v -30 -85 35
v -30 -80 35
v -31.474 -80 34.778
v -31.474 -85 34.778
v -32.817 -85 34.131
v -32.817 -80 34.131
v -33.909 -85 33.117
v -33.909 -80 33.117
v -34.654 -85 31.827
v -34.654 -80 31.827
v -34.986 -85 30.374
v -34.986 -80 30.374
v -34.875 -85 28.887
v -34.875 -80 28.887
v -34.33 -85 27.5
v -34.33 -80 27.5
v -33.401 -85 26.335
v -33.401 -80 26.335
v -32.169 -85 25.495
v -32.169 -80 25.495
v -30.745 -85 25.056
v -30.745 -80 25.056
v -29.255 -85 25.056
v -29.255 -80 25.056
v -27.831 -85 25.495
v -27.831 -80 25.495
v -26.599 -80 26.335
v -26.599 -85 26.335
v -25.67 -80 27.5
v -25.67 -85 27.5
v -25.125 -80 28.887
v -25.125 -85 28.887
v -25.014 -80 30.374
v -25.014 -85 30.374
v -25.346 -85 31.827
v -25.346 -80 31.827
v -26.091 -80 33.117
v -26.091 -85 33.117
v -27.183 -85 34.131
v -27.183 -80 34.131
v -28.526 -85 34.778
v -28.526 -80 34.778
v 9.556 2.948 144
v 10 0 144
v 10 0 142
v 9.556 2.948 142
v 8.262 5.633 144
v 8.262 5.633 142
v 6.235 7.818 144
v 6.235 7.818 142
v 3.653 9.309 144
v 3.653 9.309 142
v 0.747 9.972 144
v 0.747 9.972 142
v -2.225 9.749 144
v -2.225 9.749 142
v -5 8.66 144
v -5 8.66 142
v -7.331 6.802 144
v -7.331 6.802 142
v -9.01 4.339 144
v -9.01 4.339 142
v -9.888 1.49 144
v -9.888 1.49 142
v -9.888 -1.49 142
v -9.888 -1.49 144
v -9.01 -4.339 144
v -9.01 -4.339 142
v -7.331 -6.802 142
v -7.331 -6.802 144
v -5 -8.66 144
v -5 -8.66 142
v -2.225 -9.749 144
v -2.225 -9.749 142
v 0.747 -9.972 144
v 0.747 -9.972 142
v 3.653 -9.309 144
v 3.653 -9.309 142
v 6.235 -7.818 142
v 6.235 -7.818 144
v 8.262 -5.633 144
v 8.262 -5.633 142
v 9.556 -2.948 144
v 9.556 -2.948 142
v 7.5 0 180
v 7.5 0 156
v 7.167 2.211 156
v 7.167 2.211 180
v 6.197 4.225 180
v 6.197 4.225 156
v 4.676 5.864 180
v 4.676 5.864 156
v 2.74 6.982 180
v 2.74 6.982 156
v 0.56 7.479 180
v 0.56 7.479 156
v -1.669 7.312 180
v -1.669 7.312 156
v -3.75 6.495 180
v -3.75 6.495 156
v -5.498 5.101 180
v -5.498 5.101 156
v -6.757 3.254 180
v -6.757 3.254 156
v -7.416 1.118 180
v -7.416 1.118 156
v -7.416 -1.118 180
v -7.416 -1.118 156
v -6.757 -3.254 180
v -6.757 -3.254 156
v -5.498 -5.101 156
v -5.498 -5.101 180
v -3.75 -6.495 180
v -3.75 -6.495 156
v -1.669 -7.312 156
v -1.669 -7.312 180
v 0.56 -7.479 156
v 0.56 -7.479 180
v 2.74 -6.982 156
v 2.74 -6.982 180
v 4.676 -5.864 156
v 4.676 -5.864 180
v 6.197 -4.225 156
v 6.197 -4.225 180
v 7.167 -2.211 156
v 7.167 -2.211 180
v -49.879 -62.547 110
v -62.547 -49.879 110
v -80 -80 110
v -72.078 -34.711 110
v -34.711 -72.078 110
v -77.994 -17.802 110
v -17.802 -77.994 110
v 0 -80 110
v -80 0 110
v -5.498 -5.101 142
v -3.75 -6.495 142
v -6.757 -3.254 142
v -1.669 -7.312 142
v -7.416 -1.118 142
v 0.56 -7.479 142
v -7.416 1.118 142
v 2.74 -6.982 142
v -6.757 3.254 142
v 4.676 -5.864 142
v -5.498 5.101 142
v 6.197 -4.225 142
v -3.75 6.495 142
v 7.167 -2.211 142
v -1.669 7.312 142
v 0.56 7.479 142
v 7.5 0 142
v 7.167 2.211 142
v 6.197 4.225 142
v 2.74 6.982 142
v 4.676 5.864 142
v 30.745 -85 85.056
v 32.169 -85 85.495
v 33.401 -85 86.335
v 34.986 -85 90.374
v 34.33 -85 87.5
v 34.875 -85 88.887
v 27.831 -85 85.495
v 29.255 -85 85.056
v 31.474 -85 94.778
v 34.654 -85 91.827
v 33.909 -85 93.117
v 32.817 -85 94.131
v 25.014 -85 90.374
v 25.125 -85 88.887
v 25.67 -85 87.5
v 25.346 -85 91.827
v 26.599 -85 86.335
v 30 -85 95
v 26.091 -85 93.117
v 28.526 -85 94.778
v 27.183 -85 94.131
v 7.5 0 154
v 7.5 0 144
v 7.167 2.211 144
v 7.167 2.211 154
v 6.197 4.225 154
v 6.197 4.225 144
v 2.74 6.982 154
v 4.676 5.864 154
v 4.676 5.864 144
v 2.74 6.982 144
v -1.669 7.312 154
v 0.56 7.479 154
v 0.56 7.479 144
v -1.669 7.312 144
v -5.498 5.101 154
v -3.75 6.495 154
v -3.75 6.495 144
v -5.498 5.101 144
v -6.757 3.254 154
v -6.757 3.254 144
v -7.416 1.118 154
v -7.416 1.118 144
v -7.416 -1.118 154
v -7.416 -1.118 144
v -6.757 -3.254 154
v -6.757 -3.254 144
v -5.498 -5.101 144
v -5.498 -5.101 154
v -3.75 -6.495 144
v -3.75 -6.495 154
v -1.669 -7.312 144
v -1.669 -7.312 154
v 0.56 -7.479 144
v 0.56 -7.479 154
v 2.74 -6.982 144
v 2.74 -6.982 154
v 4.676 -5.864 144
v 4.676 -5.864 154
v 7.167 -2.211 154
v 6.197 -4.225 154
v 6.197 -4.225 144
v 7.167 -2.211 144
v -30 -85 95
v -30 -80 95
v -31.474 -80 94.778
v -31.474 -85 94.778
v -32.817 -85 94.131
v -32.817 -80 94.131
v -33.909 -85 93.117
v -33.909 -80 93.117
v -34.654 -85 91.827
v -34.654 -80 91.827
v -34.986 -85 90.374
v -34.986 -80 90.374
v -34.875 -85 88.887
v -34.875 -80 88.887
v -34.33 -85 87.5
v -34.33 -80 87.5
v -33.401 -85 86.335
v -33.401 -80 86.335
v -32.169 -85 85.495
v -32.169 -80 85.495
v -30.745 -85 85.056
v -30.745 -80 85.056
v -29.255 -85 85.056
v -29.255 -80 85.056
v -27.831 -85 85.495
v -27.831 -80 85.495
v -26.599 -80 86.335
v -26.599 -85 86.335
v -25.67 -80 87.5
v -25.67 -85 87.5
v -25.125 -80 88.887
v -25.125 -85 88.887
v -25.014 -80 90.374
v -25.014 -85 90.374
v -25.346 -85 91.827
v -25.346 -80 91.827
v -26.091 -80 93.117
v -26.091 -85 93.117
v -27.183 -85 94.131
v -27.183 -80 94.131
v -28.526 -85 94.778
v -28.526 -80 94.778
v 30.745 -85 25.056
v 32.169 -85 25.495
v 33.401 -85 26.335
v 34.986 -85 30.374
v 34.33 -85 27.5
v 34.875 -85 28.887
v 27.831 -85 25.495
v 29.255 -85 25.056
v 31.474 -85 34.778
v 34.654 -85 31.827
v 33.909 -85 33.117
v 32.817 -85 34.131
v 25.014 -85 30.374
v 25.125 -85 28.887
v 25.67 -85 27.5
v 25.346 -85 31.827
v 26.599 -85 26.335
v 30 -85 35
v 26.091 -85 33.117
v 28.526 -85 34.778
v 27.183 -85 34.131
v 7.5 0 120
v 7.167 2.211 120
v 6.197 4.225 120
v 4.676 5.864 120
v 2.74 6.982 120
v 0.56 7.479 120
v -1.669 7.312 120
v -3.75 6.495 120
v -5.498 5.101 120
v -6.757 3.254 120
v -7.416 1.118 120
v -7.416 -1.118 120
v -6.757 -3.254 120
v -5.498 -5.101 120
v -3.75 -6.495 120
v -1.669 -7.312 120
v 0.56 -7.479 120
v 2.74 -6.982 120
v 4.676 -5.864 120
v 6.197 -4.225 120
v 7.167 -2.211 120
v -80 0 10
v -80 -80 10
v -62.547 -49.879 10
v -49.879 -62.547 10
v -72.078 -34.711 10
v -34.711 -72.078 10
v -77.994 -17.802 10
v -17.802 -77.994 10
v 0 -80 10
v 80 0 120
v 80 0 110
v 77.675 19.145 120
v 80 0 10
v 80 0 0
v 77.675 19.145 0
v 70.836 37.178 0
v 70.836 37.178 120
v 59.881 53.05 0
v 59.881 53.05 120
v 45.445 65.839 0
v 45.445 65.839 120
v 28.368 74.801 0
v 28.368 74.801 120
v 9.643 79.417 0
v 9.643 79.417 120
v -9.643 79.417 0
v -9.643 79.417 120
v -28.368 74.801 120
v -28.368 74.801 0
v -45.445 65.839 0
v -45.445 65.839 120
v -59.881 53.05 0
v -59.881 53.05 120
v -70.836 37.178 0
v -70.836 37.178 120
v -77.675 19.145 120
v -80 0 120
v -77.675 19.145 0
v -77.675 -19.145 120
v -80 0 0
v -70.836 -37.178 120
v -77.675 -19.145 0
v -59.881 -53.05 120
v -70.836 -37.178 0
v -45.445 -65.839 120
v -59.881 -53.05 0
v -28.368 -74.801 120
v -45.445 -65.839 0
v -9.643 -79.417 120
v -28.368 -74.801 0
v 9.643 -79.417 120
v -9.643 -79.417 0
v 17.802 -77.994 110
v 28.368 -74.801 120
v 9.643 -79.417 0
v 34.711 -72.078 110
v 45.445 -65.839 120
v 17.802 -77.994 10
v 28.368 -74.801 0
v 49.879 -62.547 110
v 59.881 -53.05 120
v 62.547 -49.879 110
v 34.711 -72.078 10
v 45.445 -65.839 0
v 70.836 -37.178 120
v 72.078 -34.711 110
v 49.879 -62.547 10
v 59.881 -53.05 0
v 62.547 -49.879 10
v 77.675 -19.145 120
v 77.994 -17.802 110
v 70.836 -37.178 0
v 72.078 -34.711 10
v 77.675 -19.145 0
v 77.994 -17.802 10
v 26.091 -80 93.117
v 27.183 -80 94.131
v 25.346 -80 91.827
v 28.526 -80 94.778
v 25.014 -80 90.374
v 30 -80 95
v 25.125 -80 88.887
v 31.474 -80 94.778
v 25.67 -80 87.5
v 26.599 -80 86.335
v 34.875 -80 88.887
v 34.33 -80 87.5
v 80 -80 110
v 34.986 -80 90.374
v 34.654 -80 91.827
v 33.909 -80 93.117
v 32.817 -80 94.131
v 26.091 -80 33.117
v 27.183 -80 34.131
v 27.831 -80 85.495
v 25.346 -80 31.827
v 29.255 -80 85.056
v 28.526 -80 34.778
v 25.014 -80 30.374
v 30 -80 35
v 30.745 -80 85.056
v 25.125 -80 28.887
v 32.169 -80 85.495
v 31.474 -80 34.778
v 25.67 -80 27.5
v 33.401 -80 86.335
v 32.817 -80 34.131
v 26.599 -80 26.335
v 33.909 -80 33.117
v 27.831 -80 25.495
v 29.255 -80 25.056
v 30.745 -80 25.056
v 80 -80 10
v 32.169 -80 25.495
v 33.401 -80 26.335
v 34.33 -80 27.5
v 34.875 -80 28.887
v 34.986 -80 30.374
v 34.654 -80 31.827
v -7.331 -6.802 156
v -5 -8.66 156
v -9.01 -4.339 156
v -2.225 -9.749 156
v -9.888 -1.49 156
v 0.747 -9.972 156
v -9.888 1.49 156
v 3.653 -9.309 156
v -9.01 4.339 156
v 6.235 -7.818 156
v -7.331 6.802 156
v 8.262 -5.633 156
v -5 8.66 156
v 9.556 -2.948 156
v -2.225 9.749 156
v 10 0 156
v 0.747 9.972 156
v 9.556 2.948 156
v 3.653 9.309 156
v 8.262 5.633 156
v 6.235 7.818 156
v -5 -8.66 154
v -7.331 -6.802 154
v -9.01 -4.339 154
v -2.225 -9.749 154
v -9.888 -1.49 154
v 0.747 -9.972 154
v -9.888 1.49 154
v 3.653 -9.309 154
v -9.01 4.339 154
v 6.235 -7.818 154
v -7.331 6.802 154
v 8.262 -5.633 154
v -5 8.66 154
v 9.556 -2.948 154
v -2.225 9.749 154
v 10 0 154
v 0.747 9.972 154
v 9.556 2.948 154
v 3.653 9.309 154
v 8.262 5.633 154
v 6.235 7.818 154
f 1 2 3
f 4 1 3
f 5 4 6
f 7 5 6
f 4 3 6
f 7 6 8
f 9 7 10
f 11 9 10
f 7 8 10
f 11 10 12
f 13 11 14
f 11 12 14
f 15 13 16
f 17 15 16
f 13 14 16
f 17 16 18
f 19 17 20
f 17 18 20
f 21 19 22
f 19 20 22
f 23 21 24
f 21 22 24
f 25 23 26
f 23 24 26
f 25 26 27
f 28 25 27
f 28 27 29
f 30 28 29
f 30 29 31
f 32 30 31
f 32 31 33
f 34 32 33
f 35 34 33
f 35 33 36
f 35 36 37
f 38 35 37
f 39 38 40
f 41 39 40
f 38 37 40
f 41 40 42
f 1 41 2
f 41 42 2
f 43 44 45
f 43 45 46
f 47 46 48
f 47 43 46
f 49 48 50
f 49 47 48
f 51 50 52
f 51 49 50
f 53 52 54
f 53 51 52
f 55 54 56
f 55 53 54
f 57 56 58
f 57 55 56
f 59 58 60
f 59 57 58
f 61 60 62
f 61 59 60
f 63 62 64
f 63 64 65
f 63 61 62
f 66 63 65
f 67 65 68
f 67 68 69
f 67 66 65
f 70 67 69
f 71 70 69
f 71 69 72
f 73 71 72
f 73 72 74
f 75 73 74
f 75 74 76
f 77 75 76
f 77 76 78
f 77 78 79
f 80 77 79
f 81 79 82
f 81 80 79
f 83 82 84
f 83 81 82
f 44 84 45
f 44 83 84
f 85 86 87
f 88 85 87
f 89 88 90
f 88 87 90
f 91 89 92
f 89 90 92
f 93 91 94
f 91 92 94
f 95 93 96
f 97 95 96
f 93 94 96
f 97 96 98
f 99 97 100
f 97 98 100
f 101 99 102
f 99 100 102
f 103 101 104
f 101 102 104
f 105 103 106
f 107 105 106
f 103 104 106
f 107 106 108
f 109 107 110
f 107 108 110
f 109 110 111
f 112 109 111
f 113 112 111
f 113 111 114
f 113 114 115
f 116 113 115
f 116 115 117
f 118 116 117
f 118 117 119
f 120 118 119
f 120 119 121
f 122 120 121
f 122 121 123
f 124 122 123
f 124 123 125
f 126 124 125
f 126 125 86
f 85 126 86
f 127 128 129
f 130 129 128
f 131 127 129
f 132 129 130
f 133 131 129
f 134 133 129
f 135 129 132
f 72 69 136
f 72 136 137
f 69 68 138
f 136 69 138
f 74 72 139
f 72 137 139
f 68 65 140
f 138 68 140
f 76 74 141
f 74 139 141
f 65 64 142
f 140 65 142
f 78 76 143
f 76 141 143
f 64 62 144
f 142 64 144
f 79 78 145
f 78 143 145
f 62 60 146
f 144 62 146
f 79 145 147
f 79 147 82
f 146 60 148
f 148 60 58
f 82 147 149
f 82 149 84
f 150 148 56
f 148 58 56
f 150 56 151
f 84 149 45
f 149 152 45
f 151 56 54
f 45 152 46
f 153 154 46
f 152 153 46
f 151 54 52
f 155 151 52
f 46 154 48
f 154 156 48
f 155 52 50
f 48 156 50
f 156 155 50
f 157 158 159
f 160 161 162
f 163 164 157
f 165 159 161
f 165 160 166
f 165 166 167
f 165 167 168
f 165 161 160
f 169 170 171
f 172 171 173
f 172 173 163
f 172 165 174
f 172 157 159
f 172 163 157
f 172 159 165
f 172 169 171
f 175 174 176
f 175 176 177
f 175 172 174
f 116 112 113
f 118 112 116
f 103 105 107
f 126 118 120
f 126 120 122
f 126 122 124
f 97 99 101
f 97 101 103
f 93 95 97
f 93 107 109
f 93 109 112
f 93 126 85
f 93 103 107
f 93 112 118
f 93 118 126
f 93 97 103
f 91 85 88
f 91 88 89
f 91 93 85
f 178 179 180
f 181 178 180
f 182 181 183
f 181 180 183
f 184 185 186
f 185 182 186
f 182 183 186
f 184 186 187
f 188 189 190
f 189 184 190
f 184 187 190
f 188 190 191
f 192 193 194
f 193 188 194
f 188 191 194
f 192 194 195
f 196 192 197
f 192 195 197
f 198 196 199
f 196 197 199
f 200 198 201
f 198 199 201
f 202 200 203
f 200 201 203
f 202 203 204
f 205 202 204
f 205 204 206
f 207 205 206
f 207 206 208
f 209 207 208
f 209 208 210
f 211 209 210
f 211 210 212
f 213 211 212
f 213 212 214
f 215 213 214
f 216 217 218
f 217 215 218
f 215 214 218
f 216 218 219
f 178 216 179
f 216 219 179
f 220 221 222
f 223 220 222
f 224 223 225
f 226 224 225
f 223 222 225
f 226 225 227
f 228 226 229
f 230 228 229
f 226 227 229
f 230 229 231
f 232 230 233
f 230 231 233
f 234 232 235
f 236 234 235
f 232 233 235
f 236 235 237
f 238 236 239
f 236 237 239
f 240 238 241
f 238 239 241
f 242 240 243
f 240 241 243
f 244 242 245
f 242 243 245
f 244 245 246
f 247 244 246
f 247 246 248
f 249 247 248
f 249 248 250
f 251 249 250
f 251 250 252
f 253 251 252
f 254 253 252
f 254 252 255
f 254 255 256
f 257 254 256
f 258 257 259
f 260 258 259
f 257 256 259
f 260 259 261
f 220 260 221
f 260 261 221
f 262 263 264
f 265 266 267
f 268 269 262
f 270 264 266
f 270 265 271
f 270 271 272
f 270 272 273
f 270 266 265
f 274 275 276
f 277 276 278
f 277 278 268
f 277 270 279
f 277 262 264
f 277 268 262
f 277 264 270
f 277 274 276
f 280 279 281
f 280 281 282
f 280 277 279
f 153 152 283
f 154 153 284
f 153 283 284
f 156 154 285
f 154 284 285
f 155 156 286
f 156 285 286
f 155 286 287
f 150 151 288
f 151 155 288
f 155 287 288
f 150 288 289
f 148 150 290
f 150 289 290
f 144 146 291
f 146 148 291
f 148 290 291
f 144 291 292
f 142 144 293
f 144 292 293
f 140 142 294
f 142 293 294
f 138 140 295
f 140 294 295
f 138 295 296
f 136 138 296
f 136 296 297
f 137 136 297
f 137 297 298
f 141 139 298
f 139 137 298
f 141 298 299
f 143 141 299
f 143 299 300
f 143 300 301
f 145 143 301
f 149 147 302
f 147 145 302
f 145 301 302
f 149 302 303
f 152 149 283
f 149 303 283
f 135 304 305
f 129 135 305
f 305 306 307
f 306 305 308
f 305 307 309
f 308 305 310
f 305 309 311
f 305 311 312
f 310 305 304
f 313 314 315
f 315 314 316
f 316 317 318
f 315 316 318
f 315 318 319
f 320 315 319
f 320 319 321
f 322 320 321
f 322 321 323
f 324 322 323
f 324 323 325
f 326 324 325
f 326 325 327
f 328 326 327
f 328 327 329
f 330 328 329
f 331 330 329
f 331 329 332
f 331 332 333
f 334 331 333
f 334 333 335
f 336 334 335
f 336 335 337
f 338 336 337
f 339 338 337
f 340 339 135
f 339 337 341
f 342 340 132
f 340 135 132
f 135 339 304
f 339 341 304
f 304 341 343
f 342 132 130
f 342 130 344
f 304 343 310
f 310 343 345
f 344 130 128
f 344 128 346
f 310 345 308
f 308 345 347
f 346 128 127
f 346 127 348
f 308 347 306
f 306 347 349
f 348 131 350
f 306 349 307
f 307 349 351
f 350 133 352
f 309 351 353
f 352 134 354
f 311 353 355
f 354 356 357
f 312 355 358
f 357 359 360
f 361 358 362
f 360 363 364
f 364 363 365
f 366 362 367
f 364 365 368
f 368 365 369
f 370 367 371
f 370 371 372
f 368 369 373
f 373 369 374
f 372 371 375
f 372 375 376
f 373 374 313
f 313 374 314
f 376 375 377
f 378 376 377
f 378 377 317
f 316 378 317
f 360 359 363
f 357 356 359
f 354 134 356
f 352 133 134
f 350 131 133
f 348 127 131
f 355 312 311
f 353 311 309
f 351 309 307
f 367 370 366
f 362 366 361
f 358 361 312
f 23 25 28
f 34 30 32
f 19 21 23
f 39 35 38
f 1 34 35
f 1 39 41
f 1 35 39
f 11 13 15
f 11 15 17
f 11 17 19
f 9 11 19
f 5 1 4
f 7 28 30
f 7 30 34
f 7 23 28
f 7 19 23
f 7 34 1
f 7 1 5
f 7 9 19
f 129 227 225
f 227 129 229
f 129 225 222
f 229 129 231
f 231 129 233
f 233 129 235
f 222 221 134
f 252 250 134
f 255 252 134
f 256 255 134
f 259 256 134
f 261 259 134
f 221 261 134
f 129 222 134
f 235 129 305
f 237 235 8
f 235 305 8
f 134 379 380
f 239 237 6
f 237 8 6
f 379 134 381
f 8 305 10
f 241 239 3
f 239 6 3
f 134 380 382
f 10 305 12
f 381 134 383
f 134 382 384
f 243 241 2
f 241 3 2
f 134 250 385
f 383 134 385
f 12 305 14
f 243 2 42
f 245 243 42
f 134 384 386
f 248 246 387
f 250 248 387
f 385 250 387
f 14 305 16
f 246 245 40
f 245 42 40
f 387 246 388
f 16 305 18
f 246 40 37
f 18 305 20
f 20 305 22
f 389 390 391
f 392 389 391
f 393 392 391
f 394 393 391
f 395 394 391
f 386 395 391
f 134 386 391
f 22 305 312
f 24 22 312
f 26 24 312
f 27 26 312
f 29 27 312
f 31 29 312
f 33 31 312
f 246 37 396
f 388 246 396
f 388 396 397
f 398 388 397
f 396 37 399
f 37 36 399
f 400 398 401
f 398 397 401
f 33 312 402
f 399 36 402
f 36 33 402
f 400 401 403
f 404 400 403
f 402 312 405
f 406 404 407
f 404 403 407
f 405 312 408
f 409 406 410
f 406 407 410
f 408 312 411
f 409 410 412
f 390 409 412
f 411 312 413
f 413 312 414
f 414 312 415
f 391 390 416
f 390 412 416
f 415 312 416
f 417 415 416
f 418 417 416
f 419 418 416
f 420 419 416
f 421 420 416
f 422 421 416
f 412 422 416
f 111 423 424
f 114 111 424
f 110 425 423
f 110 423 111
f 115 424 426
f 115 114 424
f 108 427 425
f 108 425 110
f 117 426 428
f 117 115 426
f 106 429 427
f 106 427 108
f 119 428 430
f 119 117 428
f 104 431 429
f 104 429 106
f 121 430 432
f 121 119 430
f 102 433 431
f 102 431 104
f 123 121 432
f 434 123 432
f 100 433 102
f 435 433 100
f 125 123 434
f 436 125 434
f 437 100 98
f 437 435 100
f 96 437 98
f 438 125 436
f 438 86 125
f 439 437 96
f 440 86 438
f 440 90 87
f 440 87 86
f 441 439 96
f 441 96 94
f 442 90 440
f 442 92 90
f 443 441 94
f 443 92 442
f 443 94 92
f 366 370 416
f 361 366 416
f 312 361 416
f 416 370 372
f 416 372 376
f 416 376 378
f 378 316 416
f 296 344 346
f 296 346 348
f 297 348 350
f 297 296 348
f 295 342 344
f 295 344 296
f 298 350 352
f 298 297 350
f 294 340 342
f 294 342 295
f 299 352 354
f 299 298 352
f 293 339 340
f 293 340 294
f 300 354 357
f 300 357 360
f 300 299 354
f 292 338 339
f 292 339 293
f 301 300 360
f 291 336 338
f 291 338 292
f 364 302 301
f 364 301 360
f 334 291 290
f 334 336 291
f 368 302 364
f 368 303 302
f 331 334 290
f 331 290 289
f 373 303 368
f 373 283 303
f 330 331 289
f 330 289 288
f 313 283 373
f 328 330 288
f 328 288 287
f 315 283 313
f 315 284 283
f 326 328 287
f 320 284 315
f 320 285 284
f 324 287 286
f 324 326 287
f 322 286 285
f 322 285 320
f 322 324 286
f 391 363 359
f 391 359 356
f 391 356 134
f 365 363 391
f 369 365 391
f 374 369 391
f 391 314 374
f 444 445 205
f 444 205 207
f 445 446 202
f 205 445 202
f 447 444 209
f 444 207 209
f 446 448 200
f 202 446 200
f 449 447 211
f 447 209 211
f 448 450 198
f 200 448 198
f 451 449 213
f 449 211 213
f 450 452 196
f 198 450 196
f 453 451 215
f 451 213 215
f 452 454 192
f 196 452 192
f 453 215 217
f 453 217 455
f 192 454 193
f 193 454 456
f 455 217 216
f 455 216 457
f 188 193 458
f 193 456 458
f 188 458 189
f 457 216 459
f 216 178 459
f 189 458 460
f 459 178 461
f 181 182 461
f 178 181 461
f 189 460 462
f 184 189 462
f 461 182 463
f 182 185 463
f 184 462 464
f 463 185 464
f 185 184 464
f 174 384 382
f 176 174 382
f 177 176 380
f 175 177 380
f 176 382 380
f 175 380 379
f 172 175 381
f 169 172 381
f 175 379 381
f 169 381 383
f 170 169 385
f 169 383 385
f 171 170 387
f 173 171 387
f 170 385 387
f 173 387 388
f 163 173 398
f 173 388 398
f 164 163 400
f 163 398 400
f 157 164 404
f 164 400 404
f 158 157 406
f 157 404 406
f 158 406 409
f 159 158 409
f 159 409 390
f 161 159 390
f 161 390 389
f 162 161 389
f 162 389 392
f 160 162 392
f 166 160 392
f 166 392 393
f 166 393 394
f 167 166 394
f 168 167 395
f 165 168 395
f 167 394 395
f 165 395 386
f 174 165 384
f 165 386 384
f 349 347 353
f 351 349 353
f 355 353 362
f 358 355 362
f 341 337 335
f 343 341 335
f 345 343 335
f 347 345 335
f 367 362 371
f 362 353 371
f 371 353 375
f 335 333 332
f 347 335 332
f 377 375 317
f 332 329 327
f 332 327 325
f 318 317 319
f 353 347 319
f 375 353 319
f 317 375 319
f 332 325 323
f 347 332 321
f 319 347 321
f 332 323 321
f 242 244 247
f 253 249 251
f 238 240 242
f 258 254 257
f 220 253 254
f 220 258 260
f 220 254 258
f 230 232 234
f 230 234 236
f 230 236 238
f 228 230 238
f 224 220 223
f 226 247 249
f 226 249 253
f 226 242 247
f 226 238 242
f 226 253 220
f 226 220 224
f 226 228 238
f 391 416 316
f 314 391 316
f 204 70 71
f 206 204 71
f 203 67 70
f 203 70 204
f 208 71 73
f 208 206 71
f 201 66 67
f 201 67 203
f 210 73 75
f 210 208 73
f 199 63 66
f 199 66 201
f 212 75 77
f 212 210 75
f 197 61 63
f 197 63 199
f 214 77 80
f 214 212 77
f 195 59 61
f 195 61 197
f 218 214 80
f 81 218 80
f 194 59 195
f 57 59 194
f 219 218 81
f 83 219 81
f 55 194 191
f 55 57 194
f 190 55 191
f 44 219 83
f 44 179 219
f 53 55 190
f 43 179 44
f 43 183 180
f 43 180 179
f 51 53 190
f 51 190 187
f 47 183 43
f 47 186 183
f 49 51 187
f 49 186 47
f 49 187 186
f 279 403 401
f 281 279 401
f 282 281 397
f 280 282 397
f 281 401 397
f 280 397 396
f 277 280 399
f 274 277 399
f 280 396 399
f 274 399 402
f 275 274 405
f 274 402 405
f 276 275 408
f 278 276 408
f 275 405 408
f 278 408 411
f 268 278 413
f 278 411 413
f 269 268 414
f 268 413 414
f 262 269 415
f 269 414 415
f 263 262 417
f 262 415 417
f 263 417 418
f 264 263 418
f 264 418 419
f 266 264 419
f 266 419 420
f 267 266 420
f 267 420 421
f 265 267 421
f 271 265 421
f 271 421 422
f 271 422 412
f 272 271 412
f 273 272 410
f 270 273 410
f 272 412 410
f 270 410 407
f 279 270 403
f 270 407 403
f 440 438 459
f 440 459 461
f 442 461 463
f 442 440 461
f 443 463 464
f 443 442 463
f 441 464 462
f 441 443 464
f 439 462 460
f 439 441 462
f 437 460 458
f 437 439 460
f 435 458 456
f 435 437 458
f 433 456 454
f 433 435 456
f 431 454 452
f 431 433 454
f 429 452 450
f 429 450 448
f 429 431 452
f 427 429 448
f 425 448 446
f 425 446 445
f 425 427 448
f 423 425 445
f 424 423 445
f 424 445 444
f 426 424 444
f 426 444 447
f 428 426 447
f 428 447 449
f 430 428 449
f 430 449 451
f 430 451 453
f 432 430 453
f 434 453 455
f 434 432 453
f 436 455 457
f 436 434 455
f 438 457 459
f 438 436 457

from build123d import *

# Parameters (mm, degrees)
IZIM2_R                     = 80
Y_KSEKLIK_EKSTR_ZYON1_DEPTH = 120
Y_KSEKLIK_EKSTR_ZYON3_START = 10
Y_KSEKLIK_EKSTR_ZYON3_DEPTH = 100
IZIM5_R                     = 5
Y_KSEKLIK_EKSTR_ZYON4_DEPTH = 5
IZIM8_R                     = 7.5
Y_KSEKLIK_EKSTR_ZYON6_DEPTH = 60
Y_KSEKLIK_EKSTR_ZYON7_START = 24
IZIM9_R                     = 10
Y_KSEKLIK_EKSTR_ZYON7_DEPTH = 2
Y_KSEKLIK_EKSTR_ZYON8_START = 12
IZIM10_R                    = 10
Y_KSEKLIK_EKSTR_ZYON8_DEPTH = 2


with BuildPart() as part:
    # Çizim2 → Yükseklik-Ekstrüzyon1 (new body)
    with BuildSketch(Plane.XY):
        Circle(IZIM2_R)
    extrude(amount=Y_KSEKLIK_EKSTR_ZYON1_DEPTH)

    # Çizim3 → Yükseklik-Ekstrüzyon3 (add)
    with BuildSketch(Plane.XY.offset(Y_KSEKLIK_EKSTR_ZYON3_START)):
        with BuildLine():
            ThreePointArc((80, 0), (56.568542608, -56.568542382), (3.2e-07, -80))
            Line((3.2e-07, -80), (80, -80))
            Line((80, -80), (80, 0))
        make_face()
        with BuildLine():
            ThreePointArc((3.2e-07, -80), (-56.568542382, -56.568542608), (-80, 0))
            Line((-80, 0), (-80, -80))
            Line((-80, -80), (3.2e-07, -80))
        make_face()
    extrude(amount=Y_KSEKLIK_EKSTR_ZYON3_DEPTH)

    # Çizim5 → Yükseklik-Ekstrüzyon4 (add)
    with BuildSketch(Plane.XZ.offset(80)):
        with Locations(Location((30, 90, 0), (0, 0, 90))):
            Circle(IZIM5_R)
        with Locations(Location((30, 30, 0), (0, 0, 90))):
            Circle(IZIM5_R)
        with Locations(Location((-30, 90, 0), (0, 0, 90))):
            Circle(IZIM5_R)
        with Locations(Location((-30, 30, 0), (0, 0, 90))):
            Circle(IZIM5_R)
    extrude(amount=Y_KSEKLIK_EKSTR_ZYON4_DEPTH)

    # Çizim8 → Yükseklik-Ekstrüzyon6 (add)
    with BuildSketch(Plane.XY.offset(120)):
        Circle(IZIM8_R)
    extrude(amount=Y_KSEKLIK_EKSTR_ZYON6_DEPTH)

    # Çizim9 → Yükseklik-Ekstrüzyon7 (add)
    with BuildSketch(Plane.XY.offset(120).offset(Y_KSEKLIK_EKSTR_ZYON7_START)):
        Circle(IZIM9_R)
    extrude(amount=-Y_KSEKLIK_EKSTR_ZYON7_DEPTH)

    # Çizim10 → Yükseklik-Ekstrüzyon8 (add)
    with BuildSketch(Plane.XY.offset(144).offset(Y_KSEKLIK_EKSTR_ZYON8_START)):
        Circle(IZIM10_R)
    extrude(amount=-Y_KSEKLIK_EKSTR_ZYON8_DEPTH)


solid = part.part
